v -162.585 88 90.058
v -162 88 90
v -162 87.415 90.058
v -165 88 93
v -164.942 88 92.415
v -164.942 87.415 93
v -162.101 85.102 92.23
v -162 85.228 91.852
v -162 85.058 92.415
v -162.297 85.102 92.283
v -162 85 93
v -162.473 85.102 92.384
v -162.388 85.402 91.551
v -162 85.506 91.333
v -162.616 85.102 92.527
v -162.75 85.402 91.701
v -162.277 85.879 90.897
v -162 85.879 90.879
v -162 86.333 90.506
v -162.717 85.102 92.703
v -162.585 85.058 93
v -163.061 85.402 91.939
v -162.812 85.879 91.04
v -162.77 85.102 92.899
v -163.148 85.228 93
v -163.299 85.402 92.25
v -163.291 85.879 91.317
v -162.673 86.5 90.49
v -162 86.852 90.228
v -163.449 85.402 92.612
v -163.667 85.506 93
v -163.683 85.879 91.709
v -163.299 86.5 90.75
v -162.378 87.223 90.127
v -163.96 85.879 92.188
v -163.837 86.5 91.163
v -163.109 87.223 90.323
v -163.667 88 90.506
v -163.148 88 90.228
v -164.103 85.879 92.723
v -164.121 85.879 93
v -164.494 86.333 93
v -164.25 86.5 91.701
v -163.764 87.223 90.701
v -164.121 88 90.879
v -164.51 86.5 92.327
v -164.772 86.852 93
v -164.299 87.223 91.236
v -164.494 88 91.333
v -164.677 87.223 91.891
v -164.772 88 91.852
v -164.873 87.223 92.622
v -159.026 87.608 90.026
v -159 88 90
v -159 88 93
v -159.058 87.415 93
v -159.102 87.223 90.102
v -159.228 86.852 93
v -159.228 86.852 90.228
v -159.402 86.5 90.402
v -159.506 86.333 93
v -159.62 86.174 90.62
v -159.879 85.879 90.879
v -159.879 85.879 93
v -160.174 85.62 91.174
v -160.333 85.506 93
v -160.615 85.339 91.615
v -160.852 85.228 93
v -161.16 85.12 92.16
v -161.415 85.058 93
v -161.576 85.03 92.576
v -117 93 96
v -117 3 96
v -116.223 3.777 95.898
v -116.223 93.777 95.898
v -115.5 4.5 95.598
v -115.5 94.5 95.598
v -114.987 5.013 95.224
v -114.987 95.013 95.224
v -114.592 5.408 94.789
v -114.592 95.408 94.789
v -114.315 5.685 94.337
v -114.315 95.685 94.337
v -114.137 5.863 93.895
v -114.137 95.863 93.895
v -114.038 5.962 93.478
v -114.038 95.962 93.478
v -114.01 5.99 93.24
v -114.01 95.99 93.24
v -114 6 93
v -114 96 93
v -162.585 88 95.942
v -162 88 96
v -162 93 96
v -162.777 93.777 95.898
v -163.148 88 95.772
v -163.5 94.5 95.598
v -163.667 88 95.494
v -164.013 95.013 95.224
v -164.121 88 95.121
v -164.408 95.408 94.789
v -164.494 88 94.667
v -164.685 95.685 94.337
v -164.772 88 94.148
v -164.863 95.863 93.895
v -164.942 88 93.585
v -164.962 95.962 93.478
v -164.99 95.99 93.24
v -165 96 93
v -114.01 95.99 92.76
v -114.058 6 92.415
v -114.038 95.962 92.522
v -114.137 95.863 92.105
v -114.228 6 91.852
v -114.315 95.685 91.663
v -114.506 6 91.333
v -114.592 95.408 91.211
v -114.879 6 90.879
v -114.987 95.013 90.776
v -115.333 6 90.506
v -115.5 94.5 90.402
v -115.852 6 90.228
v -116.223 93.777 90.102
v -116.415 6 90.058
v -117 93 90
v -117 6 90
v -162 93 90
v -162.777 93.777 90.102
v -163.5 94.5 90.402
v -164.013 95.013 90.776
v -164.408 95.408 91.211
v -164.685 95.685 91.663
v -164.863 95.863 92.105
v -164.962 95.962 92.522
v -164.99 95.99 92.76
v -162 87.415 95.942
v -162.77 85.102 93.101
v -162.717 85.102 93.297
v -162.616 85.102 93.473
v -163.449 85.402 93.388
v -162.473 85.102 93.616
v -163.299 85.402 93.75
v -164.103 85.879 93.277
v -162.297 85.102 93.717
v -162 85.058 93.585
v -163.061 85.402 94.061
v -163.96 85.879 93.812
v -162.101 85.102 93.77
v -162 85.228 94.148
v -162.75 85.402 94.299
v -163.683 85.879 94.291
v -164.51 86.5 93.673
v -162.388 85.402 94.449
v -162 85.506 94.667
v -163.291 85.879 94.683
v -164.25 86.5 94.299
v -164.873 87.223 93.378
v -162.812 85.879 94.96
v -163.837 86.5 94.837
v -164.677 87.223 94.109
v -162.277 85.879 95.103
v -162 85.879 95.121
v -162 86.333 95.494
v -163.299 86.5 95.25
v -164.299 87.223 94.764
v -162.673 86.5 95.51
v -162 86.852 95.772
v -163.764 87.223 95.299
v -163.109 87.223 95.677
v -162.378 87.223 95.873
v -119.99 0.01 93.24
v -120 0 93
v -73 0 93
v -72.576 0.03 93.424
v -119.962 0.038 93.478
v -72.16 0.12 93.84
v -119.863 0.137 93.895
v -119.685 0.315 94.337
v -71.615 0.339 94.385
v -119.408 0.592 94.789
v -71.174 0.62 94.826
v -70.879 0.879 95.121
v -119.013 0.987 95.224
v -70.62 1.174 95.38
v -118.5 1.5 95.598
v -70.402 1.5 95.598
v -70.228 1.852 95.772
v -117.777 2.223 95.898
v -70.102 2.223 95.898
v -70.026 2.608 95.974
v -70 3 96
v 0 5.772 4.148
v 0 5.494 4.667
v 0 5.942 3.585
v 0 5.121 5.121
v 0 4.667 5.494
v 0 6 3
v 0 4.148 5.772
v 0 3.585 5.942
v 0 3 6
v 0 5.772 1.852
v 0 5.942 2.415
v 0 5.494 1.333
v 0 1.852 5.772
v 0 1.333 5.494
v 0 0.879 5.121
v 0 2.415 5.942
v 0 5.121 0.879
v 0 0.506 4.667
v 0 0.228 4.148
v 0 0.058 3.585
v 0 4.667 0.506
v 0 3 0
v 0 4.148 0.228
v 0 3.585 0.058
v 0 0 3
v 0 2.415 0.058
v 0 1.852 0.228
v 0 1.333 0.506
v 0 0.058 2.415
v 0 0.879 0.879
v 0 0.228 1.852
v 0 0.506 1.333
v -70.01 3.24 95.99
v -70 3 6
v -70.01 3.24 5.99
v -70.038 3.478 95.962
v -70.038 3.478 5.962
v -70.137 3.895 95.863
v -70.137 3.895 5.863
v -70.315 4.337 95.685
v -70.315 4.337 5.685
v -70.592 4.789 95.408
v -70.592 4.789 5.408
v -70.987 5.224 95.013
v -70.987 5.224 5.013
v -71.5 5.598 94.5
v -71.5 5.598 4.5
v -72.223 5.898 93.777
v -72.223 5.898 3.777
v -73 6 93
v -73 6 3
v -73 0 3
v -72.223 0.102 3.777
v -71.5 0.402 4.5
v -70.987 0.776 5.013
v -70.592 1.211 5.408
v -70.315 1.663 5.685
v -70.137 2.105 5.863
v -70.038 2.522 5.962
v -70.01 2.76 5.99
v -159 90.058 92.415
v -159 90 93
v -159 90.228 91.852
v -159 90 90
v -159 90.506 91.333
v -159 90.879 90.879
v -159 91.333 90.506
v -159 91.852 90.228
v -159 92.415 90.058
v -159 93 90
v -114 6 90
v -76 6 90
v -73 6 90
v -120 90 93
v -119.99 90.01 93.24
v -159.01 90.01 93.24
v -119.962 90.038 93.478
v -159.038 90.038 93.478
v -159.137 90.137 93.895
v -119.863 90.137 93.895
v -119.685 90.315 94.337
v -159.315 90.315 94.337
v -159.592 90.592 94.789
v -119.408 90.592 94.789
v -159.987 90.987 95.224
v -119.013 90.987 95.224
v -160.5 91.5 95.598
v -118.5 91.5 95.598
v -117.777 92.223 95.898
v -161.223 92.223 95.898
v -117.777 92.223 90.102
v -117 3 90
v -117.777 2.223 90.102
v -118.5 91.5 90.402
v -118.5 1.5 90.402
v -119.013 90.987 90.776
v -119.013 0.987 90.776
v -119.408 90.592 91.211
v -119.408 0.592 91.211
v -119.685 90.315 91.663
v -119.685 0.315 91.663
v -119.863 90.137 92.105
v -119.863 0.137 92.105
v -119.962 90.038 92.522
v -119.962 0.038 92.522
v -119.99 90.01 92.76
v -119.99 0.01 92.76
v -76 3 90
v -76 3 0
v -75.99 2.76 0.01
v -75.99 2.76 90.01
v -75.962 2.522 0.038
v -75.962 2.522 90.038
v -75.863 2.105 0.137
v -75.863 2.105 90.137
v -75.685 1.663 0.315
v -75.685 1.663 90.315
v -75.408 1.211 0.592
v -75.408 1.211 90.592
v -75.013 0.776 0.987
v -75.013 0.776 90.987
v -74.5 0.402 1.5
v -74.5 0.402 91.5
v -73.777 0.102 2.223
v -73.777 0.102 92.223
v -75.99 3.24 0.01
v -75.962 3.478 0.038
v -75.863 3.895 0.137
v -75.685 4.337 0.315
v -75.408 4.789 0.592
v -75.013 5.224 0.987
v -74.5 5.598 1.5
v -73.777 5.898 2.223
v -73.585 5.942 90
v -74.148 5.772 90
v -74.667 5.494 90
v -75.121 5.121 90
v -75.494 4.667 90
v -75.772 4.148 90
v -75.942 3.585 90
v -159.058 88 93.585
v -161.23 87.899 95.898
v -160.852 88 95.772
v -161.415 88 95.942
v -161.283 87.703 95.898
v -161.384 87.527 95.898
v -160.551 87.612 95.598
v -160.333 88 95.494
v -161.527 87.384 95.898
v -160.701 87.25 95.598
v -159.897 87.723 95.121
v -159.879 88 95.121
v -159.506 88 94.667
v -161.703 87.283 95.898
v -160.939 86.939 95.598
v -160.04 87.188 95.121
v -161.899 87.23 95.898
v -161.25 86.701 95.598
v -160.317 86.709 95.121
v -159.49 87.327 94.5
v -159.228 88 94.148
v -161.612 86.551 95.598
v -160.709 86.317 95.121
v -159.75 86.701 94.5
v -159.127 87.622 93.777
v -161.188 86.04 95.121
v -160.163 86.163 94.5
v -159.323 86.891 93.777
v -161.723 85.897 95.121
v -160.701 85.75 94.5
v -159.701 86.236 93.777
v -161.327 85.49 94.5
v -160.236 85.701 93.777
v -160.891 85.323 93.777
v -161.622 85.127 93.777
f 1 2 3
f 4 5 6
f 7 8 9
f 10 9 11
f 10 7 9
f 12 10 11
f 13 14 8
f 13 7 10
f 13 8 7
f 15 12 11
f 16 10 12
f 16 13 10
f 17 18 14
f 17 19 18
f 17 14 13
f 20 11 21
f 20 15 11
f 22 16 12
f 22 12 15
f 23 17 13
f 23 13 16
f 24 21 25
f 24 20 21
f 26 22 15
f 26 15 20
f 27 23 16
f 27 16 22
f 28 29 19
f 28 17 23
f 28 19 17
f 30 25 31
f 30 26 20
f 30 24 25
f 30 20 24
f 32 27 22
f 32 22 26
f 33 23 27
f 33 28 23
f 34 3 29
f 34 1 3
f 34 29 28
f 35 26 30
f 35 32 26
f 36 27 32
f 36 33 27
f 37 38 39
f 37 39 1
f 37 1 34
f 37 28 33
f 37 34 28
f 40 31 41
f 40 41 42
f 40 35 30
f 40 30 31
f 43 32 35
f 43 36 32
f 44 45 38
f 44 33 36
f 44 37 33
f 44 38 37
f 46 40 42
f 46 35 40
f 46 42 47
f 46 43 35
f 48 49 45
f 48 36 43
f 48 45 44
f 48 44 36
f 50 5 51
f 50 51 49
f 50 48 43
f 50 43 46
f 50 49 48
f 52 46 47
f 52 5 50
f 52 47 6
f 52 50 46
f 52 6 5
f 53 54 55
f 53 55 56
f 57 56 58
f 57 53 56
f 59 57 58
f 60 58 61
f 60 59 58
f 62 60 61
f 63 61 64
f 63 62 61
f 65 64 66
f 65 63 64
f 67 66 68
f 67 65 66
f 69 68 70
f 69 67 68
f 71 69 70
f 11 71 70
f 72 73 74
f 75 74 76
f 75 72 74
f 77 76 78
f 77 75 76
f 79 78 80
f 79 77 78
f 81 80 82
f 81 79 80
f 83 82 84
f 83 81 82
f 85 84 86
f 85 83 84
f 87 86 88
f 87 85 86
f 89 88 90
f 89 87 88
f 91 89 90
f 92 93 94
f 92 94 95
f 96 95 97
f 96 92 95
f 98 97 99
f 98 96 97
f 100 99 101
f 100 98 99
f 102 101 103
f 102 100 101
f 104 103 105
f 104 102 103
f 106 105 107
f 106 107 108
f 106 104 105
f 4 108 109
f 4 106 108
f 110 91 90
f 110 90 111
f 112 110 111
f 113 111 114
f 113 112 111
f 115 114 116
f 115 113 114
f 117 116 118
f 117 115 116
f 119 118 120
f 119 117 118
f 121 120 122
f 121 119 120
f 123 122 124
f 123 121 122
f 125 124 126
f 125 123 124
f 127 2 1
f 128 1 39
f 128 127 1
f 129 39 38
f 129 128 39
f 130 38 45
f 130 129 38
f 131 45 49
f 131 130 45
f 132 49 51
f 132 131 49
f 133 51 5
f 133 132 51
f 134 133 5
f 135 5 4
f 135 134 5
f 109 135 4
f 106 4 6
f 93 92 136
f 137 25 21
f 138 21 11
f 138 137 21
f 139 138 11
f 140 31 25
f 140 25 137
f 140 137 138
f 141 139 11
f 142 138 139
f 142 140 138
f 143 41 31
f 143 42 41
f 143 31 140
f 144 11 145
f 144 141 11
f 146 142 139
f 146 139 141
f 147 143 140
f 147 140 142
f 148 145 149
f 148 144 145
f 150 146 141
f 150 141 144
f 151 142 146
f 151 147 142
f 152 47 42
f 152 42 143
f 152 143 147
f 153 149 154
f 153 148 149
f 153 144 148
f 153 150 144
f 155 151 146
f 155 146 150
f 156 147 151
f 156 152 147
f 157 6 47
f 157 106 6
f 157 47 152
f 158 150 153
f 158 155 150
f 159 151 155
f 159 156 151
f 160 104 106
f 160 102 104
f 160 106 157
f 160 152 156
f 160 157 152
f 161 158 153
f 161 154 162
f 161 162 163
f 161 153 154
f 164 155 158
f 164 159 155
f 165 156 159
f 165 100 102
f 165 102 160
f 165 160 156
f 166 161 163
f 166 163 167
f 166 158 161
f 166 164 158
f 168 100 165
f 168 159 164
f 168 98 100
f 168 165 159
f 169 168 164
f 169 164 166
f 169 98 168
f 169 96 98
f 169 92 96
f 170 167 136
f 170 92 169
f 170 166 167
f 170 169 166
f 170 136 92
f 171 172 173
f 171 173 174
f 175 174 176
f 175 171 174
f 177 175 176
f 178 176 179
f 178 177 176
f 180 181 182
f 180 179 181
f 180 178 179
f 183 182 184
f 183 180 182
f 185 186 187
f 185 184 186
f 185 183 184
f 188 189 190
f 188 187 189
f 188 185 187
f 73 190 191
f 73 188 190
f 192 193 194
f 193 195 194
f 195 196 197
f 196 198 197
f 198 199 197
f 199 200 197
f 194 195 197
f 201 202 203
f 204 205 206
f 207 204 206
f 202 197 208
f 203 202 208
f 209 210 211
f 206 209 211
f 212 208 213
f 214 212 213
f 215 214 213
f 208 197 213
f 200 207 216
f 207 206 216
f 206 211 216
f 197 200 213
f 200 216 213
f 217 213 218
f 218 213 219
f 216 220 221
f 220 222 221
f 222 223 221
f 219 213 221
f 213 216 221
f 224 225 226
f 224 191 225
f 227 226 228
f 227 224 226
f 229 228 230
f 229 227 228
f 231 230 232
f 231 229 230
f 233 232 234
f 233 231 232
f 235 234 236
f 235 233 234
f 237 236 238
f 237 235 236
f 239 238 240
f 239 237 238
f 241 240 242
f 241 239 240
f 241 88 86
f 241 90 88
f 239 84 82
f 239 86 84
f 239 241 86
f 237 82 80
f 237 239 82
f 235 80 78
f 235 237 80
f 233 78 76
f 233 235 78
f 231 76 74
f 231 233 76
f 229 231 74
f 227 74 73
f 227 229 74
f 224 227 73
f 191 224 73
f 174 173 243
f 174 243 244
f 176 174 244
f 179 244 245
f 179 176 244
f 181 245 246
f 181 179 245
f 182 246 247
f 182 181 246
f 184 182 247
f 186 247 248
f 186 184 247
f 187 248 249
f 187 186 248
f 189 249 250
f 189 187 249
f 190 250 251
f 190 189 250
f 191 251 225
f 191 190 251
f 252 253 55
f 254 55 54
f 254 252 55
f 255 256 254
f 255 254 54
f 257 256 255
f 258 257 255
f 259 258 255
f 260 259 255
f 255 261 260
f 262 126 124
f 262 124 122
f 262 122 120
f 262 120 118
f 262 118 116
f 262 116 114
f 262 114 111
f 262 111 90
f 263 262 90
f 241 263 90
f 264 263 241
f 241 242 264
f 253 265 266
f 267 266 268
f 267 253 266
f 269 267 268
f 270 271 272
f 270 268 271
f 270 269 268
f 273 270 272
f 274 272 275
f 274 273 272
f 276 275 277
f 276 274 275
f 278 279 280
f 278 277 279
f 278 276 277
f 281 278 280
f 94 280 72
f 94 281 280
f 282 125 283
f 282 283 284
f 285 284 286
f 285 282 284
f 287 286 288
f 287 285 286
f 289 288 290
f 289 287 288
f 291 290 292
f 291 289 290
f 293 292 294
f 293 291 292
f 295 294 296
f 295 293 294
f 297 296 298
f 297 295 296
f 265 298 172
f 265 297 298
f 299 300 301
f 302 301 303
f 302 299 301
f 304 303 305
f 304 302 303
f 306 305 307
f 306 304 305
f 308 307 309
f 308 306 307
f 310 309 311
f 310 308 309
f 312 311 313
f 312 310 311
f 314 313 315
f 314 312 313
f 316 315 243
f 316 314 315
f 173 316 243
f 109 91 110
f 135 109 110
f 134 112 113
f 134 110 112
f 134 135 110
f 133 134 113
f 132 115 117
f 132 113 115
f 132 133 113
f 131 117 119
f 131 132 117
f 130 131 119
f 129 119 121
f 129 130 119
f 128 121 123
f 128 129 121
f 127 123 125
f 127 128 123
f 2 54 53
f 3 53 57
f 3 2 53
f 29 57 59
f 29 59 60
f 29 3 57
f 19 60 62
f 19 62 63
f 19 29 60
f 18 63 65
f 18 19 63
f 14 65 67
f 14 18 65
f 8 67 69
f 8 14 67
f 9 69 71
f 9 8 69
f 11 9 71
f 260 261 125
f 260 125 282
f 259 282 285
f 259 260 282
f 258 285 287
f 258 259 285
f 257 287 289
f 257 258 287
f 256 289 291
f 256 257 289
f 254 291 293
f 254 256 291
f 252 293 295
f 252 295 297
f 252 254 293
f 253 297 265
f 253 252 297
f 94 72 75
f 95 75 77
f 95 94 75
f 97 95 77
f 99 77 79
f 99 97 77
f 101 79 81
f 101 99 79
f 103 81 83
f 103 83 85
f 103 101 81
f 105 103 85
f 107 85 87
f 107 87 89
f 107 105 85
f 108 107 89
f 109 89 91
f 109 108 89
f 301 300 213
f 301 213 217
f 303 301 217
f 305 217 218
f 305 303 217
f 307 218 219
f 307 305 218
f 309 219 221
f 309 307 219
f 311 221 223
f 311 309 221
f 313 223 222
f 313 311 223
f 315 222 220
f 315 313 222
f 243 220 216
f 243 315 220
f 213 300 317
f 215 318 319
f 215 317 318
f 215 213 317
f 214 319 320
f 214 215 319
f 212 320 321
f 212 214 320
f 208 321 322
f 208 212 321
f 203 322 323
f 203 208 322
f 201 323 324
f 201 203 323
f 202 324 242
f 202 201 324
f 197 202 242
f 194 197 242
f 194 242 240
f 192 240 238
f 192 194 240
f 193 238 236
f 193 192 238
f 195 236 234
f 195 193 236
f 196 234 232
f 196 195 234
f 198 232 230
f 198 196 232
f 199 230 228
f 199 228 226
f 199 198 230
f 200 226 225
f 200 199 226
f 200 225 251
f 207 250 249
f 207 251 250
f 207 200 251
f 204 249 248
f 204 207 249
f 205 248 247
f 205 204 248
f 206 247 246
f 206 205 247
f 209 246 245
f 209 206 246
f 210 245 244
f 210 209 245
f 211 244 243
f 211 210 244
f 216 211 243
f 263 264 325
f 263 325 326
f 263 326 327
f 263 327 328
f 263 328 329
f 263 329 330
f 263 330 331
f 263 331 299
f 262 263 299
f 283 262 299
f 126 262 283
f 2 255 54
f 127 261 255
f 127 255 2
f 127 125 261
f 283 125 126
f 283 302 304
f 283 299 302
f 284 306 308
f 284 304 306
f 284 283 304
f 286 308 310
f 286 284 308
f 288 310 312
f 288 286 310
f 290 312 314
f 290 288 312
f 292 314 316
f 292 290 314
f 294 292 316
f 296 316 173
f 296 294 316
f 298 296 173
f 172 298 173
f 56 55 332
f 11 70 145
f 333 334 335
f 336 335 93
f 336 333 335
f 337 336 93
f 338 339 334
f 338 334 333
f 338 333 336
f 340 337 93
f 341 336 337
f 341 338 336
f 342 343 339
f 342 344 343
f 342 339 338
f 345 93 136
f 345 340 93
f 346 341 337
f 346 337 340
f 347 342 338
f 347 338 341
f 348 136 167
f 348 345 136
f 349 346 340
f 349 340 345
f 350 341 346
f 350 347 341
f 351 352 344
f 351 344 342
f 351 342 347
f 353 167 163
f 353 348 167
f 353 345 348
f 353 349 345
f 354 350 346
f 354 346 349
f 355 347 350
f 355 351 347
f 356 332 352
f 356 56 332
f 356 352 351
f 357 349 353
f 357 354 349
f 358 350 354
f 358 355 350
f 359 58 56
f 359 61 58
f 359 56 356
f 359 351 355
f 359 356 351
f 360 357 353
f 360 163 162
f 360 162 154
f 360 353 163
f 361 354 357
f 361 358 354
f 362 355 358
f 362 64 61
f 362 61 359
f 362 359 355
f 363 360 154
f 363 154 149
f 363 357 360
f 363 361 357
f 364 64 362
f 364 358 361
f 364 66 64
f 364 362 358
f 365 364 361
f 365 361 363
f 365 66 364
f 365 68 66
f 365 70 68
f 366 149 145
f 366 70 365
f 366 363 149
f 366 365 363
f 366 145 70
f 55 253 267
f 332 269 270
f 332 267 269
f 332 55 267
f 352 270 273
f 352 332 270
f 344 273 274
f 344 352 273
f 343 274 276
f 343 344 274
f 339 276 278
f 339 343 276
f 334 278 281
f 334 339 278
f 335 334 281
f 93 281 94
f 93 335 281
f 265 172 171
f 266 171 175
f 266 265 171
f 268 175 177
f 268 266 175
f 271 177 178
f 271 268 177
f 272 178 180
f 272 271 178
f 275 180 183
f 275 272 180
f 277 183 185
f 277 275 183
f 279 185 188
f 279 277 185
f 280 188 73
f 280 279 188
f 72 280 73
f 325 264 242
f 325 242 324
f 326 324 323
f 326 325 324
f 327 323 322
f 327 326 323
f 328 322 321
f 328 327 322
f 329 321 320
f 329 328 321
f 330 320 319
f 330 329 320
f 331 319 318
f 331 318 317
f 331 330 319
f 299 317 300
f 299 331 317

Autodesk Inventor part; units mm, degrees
ref_plane "YZ Plane" through (0, 0, 0) normal (1, 0, 0) x (0, 1, 0)
ref_plane "XZ Plane" through (0, 0, 0) normal (0, 1, 0) x (-1, 0, 0)
ref_plane "XY Plane" through (0, 0, 0) normal (0, 0, 1) x (1, 0, 0)
sketch "Skizze1" plane through (0, 0, 0) normal (0, 1, 0) x (-1, 0, 0)
  line L0 (0, 0) -> (70, 0)
  line L1 (70, 0) -> (70, 6)
  line L2 (70, 6) -> (0, 6)
  line L3 (0, 6) -> (0, 0)
  dimension "d0" = 70
  dimension "d1" = 6
extrude "Extrusion1" add sketch "Skizze1" along normal blind 6
sketch "Skizze2" plane through (0, 0, 0) normal (0, 0, 1) x (1, 0, 0)
  line L0 (0, 0) -> (-70, 0) projected
  line L1 (-70, 0) -> (-76, 0)
  line L2 (-76, 0) -> (-76, 6)
  line L3 (-76, 6) -> (-70, 6)
  line L4 (-70, 6) -> (-70, 0)
  dimension "d4" = 6
  dimension "d5" = 6
extrude "Extrusion2" add sketch "Skizze2" along normal blind 90
sketch "Skizze3" plane through (0, 0, 90) normal (0, 0, 1) x (1, 0, 0)
  line L0 (-70, 0) -> (0, 0) projected
  line L1 (-70, 0) -> (-120, 0)
  line L2 (-120, 0) -> (-120, 6)
  line L3 (-120, 6) -> (-70, 6)
  line L4 (-70, 6) -> (-70, 0)
  dimension "d8" = 50
extrude "Extrusion3" add sketch "Skizze3" along normal blind 6
sketch "Skizze4" plane through (0, 6, 0) normal (0, 1, 0) x (1, 0, 0)
  line L0 (-120, -90) -> (-76, -90) projected
  line L1 (-70, -96) -> (-120, -96) projected
  line L2 (-120, -90) -> (-114, -90)
  line L3 (-114, -90) -> (-114, -96)
  line L4 (-114, -96) -> (-120, -96)
  line L5 (-120, -96) -> (-120, -90)
  point P0 (0, 0)
  dimension "d11" = 6
extrude "Extrusion4" add sketch "Skizze4" along normal blind 90
sketch "Skizze5" plane through (-120, 0, 90) normal (-1, 0, 0) x (0, 0, 1)
  line L0 (6, 96) -> (0, 96) projected
  line L1 (0, 0) -> (0, 96) projected
  line L2 (6, 96) -> (0, 96)
  line L3 (0, 96) -> (0, 90)
  line L4 (0, 90) -> (6, 90)
  line L5 (6, 90) -> (6, 96)
  point P0 (-90, 0)
  dimension "d14" = 6
extrude "Extrusion5" add sketch "Skizze5" along normal blind 45
sketch "Skizze6" plane through (-165, 0, 90) normal (-1, 0, 0) x (0, 0, 1)
  point P0 (-90, 0)
sketch "Skizze7" plane through (-120, 90, 90) normal (0, -1, 0) x (1, 0, 0)
  line L0 (6, 6) -> (-45, 6) projected
  line L1 (6, 0) -> (-45, 0) projected
  line L2 (-45, 6) -> (-39, 6)
  line L3 (-39, 6) -> (-39, 0)
  line L4 (-39, 0) -> (-45, 0)
  line L5 (-45, 0) -> (-45, 6)
  point P0 (120, -90)
  dimension "d17" = 6
extrude "Extrusion6" add sketch "Skizze7" along normal blind 5
fillet "Rundung1" radius 3 26 edges at (-38, 0, 0) (-38, 6, 0) (-35, 6, 6) (-35, 0, 6) (-70, 0, 51) (-70, 6, 51) (-76, 6, 45) (-76, 0, 45) (-98, 0, 90) (-95, 0, 96) (-92, 6, 96) (-120, 45, 96) (-120, 45, 90) (-114, 51, 90) (-114, 51, 96) (-139.5, 90, 96) (-139.5, 90, 90) (-139.5, 96, 96) (-139.5, 96, 90) (-165, 90.5, 96) (-165, 90.5, 90) (-165, 85, 93) (-159, 85, 93) (-159, 87.5, 96) (-162, 85, 90) (-162, 85, 96)
sketch "Skizze8" plane through (0, 0, 0) normal (0, 0, 1) x (1, 0, 0)
  arc A0 (-73, 6) -> (-73, 0) centre (-73, 3) ccw projected
  line L0 (-159, 90) -> (-162, 93) projected
  point P0 (0, 0)
properties part number "Draht"
